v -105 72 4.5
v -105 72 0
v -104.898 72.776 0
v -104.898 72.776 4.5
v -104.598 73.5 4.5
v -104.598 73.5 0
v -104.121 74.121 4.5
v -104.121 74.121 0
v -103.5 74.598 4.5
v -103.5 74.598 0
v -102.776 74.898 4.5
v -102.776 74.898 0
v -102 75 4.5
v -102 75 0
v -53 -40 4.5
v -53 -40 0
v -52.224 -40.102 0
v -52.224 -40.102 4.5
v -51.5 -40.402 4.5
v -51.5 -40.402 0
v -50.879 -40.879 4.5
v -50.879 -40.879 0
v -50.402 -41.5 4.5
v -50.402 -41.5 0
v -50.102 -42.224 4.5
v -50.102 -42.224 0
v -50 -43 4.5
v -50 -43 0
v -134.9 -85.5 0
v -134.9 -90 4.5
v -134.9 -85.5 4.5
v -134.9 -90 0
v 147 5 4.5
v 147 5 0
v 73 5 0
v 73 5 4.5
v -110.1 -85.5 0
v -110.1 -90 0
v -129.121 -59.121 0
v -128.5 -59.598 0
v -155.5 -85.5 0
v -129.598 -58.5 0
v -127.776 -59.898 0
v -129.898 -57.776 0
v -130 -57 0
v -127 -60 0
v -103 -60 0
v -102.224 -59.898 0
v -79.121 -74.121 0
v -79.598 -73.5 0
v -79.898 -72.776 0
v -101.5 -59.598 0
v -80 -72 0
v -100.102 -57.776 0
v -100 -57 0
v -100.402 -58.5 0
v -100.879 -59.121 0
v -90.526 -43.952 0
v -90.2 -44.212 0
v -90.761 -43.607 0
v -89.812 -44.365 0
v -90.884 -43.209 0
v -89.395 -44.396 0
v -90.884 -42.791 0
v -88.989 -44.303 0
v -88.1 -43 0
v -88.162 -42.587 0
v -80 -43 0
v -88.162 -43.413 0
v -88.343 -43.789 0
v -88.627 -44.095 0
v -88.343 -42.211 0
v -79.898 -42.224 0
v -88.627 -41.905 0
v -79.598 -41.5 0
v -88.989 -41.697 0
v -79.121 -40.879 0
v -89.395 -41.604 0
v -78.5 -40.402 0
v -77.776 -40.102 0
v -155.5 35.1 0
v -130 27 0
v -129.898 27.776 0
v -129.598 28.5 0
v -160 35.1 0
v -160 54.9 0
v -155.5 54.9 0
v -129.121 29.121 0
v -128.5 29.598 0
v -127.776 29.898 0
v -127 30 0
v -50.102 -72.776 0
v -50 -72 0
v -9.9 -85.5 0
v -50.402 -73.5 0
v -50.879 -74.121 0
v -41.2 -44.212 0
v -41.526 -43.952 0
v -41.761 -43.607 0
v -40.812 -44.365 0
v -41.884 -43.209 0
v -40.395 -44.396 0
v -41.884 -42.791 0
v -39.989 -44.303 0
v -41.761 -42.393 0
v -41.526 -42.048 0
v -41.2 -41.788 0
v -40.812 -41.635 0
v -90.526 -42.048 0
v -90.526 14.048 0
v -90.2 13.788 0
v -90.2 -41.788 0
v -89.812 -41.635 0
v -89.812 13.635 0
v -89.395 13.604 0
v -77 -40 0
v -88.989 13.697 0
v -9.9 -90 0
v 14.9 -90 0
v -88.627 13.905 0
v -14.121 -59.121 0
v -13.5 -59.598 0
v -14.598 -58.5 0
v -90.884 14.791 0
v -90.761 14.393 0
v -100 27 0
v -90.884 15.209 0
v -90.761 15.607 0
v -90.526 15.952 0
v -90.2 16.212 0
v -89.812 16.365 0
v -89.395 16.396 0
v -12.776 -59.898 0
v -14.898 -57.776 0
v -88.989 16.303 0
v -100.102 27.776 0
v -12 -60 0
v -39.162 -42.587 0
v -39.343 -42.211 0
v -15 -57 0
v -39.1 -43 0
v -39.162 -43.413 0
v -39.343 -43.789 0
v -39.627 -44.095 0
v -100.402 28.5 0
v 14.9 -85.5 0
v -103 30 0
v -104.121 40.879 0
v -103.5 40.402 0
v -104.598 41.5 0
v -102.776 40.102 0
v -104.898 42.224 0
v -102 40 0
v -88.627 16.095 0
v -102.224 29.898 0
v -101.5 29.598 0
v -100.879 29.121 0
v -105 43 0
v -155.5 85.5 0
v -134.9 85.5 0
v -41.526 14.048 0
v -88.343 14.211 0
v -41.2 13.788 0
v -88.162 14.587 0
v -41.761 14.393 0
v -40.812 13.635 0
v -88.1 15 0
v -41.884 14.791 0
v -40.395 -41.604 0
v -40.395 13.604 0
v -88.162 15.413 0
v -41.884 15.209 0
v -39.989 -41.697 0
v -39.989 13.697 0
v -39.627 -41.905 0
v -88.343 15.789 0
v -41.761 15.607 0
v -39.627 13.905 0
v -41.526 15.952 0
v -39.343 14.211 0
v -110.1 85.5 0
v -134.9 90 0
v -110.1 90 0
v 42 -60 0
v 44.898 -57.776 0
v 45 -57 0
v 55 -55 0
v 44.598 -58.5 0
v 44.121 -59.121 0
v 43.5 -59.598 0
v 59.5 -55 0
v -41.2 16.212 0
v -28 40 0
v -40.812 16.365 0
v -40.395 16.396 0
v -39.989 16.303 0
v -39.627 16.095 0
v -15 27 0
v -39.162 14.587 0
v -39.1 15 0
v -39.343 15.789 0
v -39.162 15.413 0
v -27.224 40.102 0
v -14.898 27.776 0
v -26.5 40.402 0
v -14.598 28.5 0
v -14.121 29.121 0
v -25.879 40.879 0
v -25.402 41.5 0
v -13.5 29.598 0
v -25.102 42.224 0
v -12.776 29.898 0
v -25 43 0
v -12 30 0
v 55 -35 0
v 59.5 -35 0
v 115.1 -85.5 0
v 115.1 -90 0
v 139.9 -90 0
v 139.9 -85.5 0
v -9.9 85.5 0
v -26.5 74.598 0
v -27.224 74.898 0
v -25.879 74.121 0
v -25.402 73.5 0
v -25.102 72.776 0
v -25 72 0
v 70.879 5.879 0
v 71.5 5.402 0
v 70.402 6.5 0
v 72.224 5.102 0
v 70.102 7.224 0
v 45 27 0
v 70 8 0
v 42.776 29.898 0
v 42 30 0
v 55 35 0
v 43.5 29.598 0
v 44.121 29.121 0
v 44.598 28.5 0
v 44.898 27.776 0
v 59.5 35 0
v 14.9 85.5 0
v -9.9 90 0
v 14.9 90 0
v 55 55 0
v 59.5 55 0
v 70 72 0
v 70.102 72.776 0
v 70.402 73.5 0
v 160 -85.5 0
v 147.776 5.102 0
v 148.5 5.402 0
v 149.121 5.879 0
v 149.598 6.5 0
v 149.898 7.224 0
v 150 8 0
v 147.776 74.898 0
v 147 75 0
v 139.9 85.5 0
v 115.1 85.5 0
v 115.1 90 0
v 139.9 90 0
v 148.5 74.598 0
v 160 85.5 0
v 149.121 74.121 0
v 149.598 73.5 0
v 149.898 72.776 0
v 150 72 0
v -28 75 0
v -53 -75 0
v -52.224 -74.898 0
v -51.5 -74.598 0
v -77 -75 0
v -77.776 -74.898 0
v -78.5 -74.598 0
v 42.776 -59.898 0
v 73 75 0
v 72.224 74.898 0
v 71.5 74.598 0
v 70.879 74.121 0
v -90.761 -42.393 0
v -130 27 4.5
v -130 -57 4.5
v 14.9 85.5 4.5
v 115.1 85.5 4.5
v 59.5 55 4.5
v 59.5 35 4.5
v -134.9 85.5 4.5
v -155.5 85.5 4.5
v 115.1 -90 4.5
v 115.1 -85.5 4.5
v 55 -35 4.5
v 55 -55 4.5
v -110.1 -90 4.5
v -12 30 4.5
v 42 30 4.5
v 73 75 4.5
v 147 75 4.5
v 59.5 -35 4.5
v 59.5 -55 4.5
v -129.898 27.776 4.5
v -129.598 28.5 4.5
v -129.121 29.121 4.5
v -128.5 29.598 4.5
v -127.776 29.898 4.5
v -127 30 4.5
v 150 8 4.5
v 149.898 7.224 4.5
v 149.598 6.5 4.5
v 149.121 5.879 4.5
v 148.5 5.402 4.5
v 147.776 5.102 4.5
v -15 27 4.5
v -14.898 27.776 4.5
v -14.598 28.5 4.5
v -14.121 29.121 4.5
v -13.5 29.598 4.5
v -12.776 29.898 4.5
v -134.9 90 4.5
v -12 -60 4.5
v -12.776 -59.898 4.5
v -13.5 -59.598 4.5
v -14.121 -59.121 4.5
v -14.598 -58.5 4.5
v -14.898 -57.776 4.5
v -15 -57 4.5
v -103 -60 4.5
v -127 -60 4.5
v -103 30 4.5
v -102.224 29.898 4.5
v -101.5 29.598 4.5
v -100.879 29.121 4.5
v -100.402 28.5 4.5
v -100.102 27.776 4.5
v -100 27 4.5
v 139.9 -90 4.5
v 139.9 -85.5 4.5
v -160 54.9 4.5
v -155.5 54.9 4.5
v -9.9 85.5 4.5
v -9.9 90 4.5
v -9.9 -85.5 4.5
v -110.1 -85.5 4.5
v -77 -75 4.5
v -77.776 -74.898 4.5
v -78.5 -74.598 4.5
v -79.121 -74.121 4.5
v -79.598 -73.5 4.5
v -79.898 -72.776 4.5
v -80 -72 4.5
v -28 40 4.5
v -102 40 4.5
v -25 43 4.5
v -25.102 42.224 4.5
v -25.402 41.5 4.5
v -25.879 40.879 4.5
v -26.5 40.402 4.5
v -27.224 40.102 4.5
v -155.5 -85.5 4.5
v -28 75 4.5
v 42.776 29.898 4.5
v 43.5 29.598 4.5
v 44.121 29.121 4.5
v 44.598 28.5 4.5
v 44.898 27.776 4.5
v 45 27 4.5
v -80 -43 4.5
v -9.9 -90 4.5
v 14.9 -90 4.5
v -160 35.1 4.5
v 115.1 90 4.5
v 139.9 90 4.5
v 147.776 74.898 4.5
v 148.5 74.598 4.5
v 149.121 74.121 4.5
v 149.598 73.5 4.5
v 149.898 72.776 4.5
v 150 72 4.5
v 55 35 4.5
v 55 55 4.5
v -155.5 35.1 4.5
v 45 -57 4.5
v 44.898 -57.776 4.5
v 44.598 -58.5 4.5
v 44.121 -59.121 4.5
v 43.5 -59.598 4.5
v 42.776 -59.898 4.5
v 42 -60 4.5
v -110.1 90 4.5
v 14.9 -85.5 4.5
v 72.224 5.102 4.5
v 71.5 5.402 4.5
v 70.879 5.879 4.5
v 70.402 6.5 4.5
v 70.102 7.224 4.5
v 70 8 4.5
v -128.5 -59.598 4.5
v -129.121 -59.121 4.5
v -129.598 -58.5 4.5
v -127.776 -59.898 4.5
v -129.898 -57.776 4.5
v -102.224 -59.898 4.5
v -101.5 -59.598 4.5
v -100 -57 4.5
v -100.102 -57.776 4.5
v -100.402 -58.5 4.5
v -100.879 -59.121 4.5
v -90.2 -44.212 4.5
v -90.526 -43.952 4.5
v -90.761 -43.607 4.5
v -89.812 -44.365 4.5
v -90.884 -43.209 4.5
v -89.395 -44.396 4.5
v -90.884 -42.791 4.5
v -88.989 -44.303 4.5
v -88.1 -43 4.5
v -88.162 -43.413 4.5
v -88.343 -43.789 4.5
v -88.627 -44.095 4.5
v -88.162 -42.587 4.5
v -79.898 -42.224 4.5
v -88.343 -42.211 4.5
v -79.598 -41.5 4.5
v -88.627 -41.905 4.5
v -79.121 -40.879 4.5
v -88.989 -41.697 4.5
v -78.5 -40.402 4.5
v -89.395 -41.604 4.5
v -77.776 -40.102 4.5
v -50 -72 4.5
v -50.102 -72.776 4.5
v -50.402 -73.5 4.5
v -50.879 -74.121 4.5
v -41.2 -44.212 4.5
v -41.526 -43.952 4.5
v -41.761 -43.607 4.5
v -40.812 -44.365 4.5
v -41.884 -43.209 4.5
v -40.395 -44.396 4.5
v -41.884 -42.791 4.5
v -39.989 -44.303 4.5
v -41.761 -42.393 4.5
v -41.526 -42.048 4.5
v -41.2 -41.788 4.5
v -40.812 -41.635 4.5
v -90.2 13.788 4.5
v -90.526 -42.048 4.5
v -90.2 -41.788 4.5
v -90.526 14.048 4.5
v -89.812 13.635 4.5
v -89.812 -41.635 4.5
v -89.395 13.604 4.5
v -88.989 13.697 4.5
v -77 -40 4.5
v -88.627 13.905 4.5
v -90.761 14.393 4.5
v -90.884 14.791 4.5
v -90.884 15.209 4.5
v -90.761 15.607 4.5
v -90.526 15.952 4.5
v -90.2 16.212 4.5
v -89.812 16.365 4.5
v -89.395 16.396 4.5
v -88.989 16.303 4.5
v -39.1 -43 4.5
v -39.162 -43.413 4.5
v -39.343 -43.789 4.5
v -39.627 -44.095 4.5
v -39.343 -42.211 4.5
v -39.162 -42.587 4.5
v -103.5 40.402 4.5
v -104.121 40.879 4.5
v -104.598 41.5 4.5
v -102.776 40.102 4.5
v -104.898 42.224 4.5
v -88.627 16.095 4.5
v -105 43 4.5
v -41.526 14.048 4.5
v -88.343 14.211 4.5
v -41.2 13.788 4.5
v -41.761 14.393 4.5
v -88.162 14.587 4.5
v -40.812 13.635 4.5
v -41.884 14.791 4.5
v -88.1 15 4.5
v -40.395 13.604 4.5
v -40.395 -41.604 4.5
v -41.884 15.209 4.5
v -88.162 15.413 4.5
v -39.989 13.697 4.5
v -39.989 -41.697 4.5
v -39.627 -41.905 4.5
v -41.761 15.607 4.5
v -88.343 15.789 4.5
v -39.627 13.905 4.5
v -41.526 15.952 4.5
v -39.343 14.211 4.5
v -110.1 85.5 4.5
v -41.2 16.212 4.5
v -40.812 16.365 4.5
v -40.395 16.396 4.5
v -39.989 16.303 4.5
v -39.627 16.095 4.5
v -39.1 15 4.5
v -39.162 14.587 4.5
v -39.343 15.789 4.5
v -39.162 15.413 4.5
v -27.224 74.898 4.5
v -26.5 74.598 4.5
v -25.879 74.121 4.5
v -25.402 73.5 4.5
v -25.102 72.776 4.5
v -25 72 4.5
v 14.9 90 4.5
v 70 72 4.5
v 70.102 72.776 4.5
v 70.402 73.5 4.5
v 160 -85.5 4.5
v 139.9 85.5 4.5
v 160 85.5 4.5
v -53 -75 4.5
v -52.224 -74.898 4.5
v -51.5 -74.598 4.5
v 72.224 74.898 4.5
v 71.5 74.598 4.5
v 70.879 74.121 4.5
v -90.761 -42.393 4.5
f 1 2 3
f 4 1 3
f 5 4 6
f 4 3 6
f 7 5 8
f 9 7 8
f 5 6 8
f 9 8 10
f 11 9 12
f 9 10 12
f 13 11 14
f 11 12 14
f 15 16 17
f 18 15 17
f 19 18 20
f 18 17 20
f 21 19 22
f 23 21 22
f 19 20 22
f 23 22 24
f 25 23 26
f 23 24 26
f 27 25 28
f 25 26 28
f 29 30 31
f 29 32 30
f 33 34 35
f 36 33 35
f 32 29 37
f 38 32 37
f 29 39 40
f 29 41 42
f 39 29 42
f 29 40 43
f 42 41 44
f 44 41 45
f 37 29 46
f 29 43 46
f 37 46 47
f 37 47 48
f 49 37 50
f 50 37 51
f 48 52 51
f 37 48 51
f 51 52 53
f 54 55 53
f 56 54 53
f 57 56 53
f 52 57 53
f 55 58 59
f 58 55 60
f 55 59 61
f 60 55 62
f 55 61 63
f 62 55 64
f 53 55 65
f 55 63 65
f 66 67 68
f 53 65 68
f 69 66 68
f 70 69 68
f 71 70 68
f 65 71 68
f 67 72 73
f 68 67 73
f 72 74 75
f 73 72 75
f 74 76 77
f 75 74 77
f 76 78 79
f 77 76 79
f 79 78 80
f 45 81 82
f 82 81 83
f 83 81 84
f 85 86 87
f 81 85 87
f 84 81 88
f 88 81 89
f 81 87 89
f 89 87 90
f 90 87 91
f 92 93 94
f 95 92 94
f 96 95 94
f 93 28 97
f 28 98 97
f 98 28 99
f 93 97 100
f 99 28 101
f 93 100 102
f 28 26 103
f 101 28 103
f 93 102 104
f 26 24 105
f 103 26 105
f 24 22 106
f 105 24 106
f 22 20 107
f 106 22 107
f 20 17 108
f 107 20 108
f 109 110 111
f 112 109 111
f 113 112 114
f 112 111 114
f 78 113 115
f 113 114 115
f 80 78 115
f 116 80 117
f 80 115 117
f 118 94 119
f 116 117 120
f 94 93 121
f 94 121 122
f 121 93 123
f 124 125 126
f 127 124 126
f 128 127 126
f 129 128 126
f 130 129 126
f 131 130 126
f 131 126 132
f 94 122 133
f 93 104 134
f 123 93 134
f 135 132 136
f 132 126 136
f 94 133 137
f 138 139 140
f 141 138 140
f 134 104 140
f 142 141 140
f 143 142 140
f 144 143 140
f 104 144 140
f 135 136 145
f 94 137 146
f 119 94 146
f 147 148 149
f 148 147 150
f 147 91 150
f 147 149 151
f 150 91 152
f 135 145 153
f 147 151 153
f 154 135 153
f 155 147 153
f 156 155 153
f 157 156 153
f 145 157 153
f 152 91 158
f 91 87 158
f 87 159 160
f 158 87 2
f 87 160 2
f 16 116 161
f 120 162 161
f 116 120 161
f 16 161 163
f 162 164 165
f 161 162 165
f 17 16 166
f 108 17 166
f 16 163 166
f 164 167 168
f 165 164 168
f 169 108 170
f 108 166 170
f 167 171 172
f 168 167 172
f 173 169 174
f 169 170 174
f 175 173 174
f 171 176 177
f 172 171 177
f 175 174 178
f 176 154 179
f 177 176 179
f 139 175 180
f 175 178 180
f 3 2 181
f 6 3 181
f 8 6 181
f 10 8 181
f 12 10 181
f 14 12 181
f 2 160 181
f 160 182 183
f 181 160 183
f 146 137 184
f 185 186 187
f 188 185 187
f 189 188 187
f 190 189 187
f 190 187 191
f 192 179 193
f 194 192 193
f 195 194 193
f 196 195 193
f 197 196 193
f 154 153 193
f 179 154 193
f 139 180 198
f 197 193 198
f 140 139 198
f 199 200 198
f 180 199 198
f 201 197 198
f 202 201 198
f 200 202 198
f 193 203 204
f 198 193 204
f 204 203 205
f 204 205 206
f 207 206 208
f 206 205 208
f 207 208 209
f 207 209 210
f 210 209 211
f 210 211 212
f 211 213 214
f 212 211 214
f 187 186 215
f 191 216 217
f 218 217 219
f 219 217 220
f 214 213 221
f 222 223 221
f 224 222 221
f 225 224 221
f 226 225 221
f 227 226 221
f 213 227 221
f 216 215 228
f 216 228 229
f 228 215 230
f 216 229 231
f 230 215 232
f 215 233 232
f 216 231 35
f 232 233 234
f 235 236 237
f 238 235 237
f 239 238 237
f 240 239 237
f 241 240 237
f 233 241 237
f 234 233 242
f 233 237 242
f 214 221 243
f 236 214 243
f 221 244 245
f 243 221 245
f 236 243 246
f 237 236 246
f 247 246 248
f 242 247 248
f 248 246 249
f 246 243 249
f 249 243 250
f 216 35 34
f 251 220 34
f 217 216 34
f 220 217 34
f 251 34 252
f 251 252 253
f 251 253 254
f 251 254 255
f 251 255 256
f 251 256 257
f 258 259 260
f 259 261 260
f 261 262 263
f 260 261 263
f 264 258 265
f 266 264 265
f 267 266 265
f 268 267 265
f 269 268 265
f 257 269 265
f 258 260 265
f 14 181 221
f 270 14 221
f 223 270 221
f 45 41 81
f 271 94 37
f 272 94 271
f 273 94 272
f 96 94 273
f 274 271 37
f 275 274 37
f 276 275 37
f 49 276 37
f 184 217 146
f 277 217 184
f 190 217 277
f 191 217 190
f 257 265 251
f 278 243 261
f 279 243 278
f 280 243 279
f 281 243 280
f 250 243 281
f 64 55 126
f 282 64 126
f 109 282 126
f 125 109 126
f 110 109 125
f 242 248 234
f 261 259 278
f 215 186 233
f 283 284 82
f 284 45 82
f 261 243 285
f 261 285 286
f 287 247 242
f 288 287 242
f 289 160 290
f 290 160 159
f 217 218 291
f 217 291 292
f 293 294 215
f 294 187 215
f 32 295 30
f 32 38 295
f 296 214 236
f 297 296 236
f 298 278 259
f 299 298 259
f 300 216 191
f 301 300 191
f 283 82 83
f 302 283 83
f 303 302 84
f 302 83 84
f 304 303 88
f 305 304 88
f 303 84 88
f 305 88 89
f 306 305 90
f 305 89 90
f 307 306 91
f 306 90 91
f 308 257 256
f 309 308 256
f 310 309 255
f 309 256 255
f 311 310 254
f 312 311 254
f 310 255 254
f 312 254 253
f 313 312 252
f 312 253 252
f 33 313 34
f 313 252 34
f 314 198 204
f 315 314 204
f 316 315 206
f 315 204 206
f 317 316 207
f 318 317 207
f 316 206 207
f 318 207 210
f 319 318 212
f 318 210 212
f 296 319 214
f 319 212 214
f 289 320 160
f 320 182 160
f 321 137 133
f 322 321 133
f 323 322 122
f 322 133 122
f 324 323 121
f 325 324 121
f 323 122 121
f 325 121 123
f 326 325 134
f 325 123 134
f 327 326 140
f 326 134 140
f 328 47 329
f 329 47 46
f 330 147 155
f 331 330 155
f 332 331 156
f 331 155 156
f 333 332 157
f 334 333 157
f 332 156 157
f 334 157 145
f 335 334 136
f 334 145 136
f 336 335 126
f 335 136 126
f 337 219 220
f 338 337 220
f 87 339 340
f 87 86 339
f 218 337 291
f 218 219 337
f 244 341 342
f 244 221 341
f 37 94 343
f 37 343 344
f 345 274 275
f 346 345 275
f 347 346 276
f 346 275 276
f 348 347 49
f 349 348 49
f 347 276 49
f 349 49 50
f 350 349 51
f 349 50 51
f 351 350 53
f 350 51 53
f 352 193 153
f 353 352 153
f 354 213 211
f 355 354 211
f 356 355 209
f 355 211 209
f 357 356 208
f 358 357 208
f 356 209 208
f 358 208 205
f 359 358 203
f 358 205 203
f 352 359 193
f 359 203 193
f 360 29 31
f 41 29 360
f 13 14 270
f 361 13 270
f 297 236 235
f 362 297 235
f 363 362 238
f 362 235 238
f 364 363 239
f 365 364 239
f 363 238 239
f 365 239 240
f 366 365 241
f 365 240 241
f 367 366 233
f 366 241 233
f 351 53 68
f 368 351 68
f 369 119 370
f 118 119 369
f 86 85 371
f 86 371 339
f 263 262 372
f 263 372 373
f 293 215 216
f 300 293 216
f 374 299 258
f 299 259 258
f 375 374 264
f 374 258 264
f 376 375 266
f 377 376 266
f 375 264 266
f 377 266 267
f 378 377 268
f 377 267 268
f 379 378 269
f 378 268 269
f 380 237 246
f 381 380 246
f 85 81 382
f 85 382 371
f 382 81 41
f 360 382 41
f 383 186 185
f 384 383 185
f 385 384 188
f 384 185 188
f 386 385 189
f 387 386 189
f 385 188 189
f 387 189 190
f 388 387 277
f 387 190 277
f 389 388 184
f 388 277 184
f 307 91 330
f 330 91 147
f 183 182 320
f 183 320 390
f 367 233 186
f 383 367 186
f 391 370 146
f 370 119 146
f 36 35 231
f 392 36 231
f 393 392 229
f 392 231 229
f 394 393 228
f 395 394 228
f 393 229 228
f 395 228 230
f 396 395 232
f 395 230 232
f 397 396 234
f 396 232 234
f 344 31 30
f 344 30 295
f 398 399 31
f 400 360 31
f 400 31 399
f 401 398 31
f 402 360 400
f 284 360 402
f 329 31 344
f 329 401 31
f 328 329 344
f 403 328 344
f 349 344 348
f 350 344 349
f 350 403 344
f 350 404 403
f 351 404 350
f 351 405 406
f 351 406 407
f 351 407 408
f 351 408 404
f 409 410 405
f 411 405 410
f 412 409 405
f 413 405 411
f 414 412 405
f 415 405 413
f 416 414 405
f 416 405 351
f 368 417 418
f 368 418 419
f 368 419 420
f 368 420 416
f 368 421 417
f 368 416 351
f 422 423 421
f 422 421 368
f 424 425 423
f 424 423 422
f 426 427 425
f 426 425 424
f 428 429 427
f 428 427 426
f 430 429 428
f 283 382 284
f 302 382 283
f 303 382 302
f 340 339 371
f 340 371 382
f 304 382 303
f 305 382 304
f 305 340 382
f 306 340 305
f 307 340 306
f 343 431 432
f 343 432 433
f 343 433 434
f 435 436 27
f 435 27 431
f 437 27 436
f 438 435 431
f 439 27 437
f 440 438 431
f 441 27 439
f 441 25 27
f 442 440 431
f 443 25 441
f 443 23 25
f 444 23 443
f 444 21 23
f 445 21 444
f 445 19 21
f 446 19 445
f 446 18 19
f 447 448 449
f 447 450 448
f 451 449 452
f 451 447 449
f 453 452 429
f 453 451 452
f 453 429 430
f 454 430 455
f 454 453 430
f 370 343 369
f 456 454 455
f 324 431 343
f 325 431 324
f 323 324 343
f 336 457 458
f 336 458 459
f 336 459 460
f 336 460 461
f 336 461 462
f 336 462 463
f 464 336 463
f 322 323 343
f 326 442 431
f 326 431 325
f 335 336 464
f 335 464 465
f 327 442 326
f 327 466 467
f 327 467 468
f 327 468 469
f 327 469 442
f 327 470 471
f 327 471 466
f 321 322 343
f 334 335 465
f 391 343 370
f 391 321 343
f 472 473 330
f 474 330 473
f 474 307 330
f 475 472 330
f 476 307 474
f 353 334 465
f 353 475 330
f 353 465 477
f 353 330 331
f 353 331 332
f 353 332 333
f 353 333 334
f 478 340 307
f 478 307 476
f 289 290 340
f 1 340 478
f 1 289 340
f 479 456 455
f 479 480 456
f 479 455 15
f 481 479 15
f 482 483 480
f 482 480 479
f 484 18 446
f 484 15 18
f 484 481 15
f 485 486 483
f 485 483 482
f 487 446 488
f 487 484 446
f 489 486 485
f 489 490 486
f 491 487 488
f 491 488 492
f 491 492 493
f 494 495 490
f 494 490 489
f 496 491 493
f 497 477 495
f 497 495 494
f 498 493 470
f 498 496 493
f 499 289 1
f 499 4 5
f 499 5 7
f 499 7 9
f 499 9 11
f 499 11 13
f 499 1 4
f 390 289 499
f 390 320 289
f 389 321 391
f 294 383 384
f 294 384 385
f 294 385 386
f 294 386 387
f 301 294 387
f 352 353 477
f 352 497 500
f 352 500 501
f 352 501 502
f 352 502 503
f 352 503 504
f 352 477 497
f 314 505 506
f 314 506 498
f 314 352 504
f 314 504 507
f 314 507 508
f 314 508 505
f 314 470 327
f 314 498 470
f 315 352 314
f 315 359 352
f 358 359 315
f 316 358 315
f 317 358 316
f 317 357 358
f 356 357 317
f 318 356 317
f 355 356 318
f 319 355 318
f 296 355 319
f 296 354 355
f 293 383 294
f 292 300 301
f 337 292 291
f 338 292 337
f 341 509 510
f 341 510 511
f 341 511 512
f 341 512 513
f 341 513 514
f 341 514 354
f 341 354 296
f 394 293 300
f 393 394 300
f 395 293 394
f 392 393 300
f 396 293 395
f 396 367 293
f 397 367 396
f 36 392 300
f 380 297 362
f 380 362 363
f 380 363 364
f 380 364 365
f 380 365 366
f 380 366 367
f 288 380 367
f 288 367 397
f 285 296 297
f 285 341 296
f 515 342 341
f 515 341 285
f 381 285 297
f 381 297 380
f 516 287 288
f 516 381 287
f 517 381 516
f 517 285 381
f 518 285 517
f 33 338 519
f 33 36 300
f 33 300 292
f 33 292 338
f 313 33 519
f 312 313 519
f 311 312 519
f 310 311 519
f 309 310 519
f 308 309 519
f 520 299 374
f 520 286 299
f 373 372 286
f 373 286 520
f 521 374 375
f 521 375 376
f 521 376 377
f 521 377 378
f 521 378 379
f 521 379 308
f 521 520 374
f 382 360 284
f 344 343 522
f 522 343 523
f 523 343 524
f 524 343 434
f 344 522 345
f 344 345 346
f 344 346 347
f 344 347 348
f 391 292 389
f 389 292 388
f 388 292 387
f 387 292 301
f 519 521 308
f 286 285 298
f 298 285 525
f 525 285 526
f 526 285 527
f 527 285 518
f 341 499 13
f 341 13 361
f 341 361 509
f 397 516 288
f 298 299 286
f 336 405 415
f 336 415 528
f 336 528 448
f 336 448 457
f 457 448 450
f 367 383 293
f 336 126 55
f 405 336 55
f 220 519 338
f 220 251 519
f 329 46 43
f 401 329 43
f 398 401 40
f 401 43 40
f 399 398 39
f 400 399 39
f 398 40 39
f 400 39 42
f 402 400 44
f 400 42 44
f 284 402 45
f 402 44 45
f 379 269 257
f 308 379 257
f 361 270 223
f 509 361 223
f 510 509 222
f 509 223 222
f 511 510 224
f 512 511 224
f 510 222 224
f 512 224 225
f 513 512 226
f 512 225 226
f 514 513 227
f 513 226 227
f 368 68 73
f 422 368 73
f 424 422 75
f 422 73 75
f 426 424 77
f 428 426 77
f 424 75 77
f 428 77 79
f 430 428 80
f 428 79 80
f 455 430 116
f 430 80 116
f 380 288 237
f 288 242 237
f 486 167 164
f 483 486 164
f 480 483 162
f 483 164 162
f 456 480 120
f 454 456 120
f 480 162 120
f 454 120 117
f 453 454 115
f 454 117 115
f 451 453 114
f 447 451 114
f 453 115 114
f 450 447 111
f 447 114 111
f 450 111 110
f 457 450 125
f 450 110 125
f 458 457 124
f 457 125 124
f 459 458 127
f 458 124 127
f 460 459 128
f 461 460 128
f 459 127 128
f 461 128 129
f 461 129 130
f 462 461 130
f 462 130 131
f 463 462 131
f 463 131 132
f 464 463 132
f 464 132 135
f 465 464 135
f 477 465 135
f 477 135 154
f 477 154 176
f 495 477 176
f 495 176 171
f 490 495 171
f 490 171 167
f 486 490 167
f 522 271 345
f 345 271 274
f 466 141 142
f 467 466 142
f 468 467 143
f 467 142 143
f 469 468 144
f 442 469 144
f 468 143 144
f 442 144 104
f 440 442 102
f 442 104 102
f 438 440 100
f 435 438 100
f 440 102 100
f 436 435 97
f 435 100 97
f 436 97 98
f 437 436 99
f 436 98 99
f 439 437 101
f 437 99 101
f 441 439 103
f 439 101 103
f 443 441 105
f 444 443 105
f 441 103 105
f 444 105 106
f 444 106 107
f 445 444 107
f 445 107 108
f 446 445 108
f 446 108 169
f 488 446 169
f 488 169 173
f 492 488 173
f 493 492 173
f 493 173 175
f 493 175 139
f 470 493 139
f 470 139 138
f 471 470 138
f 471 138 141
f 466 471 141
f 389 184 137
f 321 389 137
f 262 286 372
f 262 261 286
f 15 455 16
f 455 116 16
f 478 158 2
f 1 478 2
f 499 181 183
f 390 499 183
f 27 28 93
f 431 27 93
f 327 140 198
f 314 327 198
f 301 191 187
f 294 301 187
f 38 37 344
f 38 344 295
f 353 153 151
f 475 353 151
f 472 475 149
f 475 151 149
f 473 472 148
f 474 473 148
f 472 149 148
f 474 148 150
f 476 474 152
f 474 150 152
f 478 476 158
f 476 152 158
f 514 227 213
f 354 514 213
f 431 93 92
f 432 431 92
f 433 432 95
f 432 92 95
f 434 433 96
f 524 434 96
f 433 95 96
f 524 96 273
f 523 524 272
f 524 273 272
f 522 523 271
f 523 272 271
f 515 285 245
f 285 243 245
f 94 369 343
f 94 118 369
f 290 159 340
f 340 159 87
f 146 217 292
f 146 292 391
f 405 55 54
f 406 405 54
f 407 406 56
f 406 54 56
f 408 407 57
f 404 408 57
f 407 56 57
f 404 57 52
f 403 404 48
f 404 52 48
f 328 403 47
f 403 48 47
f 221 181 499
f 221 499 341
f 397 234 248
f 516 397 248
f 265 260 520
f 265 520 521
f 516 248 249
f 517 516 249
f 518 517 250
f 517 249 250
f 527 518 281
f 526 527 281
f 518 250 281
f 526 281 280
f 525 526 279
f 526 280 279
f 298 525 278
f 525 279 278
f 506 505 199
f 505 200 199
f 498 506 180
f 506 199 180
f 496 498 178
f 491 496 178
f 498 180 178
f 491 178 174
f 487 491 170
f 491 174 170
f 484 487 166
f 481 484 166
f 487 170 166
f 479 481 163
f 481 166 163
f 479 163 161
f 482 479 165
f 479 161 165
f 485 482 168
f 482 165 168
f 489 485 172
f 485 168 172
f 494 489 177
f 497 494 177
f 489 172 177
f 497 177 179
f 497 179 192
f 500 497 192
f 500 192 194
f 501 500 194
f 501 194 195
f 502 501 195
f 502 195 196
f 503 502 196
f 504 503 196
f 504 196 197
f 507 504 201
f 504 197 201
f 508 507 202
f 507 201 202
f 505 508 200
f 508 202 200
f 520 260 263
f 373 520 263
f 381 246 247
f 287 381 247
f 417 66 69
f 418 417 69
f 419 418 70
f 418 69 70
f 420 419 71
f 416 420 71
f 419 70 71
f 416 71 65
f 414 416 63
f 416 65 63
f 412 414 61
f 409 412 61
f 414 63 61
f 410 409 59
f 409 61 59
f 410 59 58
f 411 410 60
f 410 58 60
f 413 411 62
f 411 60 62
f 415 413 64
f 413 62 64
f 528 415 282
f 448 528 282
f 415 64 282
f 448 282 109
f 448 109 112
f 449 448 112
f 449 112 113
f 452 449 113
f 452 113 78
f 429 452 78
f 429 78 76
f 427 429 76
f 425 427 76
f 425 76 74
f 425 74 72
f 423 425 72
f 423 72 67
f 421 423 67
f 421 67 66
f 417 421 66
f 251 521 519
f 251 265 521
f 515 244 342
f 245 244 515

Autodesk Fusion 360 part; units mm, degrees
sketch "Sketch1" plane through (0, 0, 0) normal (0, 0, 1) x (1, 0, 0)
  line L0 (160, -90) -> (-160, -90)
  line L1 (-160, -90) -> (-160, 90)
  line L2 (-160, 90) -> (160, 90)
  line L3 (160, 90) -> (160, -90)
  line L4 (160, -90) -> (-160, 90) construction
  line L5 (-160, -90) -> (160, 90) construction
  line L6 (170, 85.5) -> (-180, 85.5) construction
  line L7 (-180, -85.5) -> (170, -85.5) construction
  line L8 (-155.5, 90) -> (-155.5, -90)
  line L9 (-160, 90) -> (-135, 90)
  line L10 (-135, 90) -> (-135, 85.5)
  line L11 (-135, 85.5) -> (-160, 85.5)
  line L12 (-160, 85.5) -> (-160, 90)
  line L13 (-160, -90) -> (-135, -90)
  line L14 (-135, -90) -> (-135, -85.5)
  line L15 (-135, -85.5) -> (-160, -85.5)
  line L16 (-160, -85.5) -> (-160, -90)
  line L17 (-110, -90) -> (-10, -90)
  line L18 (-10, -90) -> (-10, -85.5)
  line L19 (-10, -85.5) -> (-110, -85.5)
  line L20 (-110, -85.5) -> (-110, -90)
  line L21 (-10, -90) -> (15, -90)
  line L22 (15, -90) -> (15, -85.5)
  line L23 (15, -85.5) -> (-10, -85.5)
  line L24 (-10, -85.5) -> (-10, -90)
  line L25 (15, -90) -> (115, -90)
  line L26 (115, -90) -> (115, -85.5)
  line L27 (115, -85.5) -> (15, -85.5)
  line L28 (15, -85.5) -> (15, -90)
  line L29 (115, -90) -> (140, -90)
  line L30 (140, -90) -> (140, -85.5)
  line L31 (140, -85.5) -> (115, -85.5)
  line L32 (115, -85.5) -> (115, -90)
  line L33 (-135, 85.5) -> (-110, 85.5)
  line L34 (-110, 85.5) -> (-110, 90)
  line L35 (-110, 90) -> (-135, 90)
  line L36 (-135, 90) -> (-135, 85.5)
  line L37 (-110, 85.5) -> (-10, 85.5)
  line L38 (-10, 85.5) -> (-10, 90)
  line L39 (-10, 90) -> (-110, 90)
  line L40 (-110, 90) -> (-110, 85.5)
  line L41 (-10, 85.5) -> (15, 85.5)
  line L42 (15, 85.5) -> (15, 90)
  line L43 (15, 90) -> (-10, 90)
  line L44 (-10, 90) -> (-10, 85.5)
  line L45 (15, 85.5) -> (115, 85.5)
  line L46 (115, 85.5) -> (115, 90)
  line L47 (115, 90) -> (15, 90)
  line L48 (15, 90) -> (15, 85.5)
  line L49 (115, 85.5) -> (140, 85.5)
  line L50 (140, 85.5) -> (140, 90)
  line L51 (140, 90) -> (115, 90)
  line L52 (115, 90) -> (115, 85.5)
  line L53 (140, 85.5) -> (160, 85.5)
  line L54 (160, 85.5) -> (160, 90)
  line L55 (160, 90) -> (140, 90)
  line L56 (140, 90) -> (140, 85.5)
  line L57 (140, -90) -> (160, -90)
  line L58 (160, -90) -> (160, -85.5)
  line L59 (160, -85.5) -> (140, -85.5)
  line L60 (140, -85.5) -> (140, -90)
  line L61 (-160, 55) -> (-155.5, 55)
  line L62 (-155.5, 55) -> (-155.5, 35)
  line L63 (-155.5, 35) -> (-160, 35)
  line L64 (-160, 35) -> (-160, 55)
  line L65 (-160, -35) -> (-155.5, -35)
  line L66 (-155.5, -35) -> (-155.5, -55)
  line L67 (-155.5, -55) -> (-160, -55)
  line L68 (-160, -55) -> (-160, -35)
  line L69 (55, 100) -> (55, -100) construction
  line L70 (59.5, 100) -> (59.5, -100) construction
  line L71 (55, 55) -> (59.5, 55)
  line L72 (59.5, 55) -> (59.5, 35)
  line L73 (59.5, 35) -> (55, 35)
  line L74 (55, 35) -> (55, 55)
  line L75 (55, -35) -> (59.5, -35)
  line L76 (59.5, -35) -> (59.5, -55)
  line L77 (59.5, -55) -> (55, -55)
  line L78 (55, -55) -> (55, -35)
  line L79 (-40.5, -43) -> (-89.5, -43) construction
  line L80 (-89.5, -43) -> (-89.5, 15) construction
  line L81 (-89.5, 15) -> (-40.5, 15) construction
  line L82 (-40.5, 15) -> (-40.5, -43) construction
  line L83 (-40.5, -43) -> (-89.5, 15) construction
  line L84 (-89.5, -43) -> (-40.5, 15) construction
  circle A0 centre (-40.5, 15) radius 1.4
  circle A1 centre (-89.5, 15) radius 1.4
  circle A2 centre (-89.5, -43) radius 1.4
  circle A3 centre (-40.5, -43) radius 1.4
  line L85 (-53, -75) -> (-77, -75)
  line L86 (-80, -72) -> (-80, -43)
  line L87 (-77, -40) -> (-53, -40)
  line L88 (-50, -43) -> (-50, -72)
  line L89 (-50, -75) -> (-80, -40) construction
  line L90 (-80, -75) -> (-50, -40) construction
  arc A4 (-77, -40) -> (-80, -43) centre (-77, -43) ccw
  arc A5 (-50, -43) -> (-53, -40) centre (-53, -43) ccw
  arc A6 (-80, -72) -> (-77, -75) centre (-77, -72) ccw
  arc A7 (-53, -75) -> (-50, -72) centre (-53, -72) ccw
  line L91 (-28, 40) -> (-102, 40)
  line L92 (-105, 43) -> (-105, 72)
  line L93 (-102, 75) -> (-28, 75)
  line L94 (-25, 72) -> (-25, 43)
  line L95 (-25, 40) -> (-105, 75) construction
  line L96 (-105, 40) -> (-25, 75) construction
  arc A8 (-102, 75) -> (-105, 72) centre (-102, 72) ccw
  arc A9 (-25, 72) -> (-28, 75) centre (-28, 72) ccw
  arc A10 (-105, 43) -> (-102, 40) centre (-102, 43) ccw
  arc A11 (-28, 40) -> (-25, 43) centre (-28, 43) ccw
  line L97 (147, 5) -> (73, 5)
  line L98 (70, 8) -> (70, 72)
  line L99 (73, 75) -> (147, 75)
  line L100 (150, 72) -> (150, 8)
  line L101 (150, 5) -> (70, 75) construction
  line L102 (70, 5) -> (150, 75) construction
  arc A12 (70, 8) -> (73, 5) centre (73, 8) ccw
  arc A13 (73, 75) -> (70, 72) centre (73, 72) ccw
  arc A14 (150, 72) -> (147, 75) centre (147, 72) ccw
  arc A15 (147, 5) -> (150, 8) centre (147, 8) ccw
  line L103 (42, -60) -> (-12, -60)
  line L104 (-15, -57) -> (-15, 27)
  line L105 (-12, 30) -> (42, 30)
  line L106 (45, 27) -> (45, -57)
  line L107 (45, -60) -> (-15, 30) construction
  line L108 (-15, -60) -> (45, 30) construction
  arc A16 (-12, 30) -> (-15, 27) centre (-12, 27) ccw
  arc A17 (45, 27) -> (42, 30) centre (42, 27) ccw
  arc A18 (-15, -57) -> (-12, -60) centre (-12, -57) ccw
  arc A19 (42, -60) -> (45, -57) centre (42, -57) ccw
  line L109 (-103, -60) -> (-127, -60)
  line L110 (-130, -57) -> (-130, 27)
  line L111 (-127, 30) -> (-103, 30)
  line L112 (-100, 27) -> (-100, -57)
  line L113 (-100, -60) -> (-130, 30) construction
  line L114 (-130, -60) -> (-100, 30) construction
  arc A20 (-127, 30) -> (-130, 27) centre (-127, 27) ccw
  arc A21 (-100, 27) -> (-103, 30) centre (-103, 27) ccw
  arc A22 (-130, -57) -> (-127, -60) centre (-127, -57) ccw
  arc A23 (-103, -60) -> (-100, -57) centre (-103, -57) ccw
  point P0 (-65, -14)
  point P1 (-65, -57.5)
  point P2 (-65, 57.5)
  point P3 (110, 40)
  point P4 (15, -15)
  point P5 (-115, -15)
  dimension "d1" = 320
  dimension "d2" = 180
  dimension "d3" = 4.5
  dimension "d4" = 4.5
  dimension "d5" = 4.5
  dimension "d6" = 25
  dimension "d7" = 25
  dimension "d8" = 100
  dimension "d9" = 25
  dimension "d10" = 25
  dimension "d11" = 100
  dimension "d12" = 25
  dimension "d13" = 25
  dimension "d14" = 100
  dimension "d15" = 25
  dimension "d16" = 100
  dimension "d17" = 25
  dimension "d18" = 20
  dimension "d19" = 20
  dimension "d20" = 35
  dimension "d21" = 35
  dimension "d22" = 215
  dimension "d23" = 4.5
  dimension "d24" = 20
  dimension "d25" = 20
  dimension "d26" = 35
  dimension "d27" = 35
  dimension "d28" = 49
  dimension "d29" = 58
  dimension "d30" = 76
  dimension "d31" = 120
  dimension "d32" = 2.8
  dimension "d33" = 2.8
  dimension "d34" = 2.8
  dimension "d35" = 2.8
  dimension "d46" = 30
  dimension "d47" = 35
  dimension "d48" = 3
  dimension "d49" = 3
  dimension "d50" = 3
  dimension "d51" = 3
  dimension "d52" = 80
  dimension "d53" = 35
  dimension "d54" = 25
  dimension "d55" = 3
  dimension "d56" = 3
  dimension "d57" = 3
  dimension "d58" = 3
  dimension "d65" = 80
  dimension "d66" = 70
  dimension "d67" = 3
  dimension "d68" = 3
  dimension "d69" = 3
  dimension "d70" = 3
  dimension "d71" = 3
  dimension "d72" = 3
  dimension "d73" = 3
  dimension "d74" = 3
  dimension "d75" = 3
  dimension "d76" = 3
  dimension "d77" = 3
  dimension "d78" = 3
  dimension "d103" = 10.5
  dimension "d104" = 10.5
  dimension "d105" = 10.5
extrude "Extrude1" add sketch "Sketch1" along normal blind 4.5 contours L0 L26 L29 L30 L31 L32 L60 | L0 L3 L8 L11 L14 L15 L19 L20 L23 L27 L31 L33 L37 L41 L45 L49 L53 L59 L62 L66 | L0 L18 L21 L22 L23 L24 L28 | L2 L46 L49 L50 L51 L52 L56 | L2 L38 L41 L42 L43 L44 L48 | L2 L10 L33 L34 L35 L36 L40 | L1 L8 L61 L62 L63 L64
move_face "OffsetFaces1" offset -0.1 6 faces at (140, -88.5, 1.5) (15, -88.5, 1.5) (-110, -87, 1.5) (140, 87, 1.5) (15, 87, 1.5) (-110, 87, 1.5)
move_face "OffsetFaces2" offset -0.1 6 faces at (115, -88.5, 1.5) (-10, -88.5, 1.5) (-135, -88.5, 1.5) (-135, 88.5, 1.5) (-10, 87, 1.5) (115, 87, 1.5)
move_face "OffsetFaces5" offset -0.1 1 faces at (-157, 35, 1.5)
move_face "OffsetFaces6" offset -0.1 1 faces at (-158.5, 55, 1.5)
